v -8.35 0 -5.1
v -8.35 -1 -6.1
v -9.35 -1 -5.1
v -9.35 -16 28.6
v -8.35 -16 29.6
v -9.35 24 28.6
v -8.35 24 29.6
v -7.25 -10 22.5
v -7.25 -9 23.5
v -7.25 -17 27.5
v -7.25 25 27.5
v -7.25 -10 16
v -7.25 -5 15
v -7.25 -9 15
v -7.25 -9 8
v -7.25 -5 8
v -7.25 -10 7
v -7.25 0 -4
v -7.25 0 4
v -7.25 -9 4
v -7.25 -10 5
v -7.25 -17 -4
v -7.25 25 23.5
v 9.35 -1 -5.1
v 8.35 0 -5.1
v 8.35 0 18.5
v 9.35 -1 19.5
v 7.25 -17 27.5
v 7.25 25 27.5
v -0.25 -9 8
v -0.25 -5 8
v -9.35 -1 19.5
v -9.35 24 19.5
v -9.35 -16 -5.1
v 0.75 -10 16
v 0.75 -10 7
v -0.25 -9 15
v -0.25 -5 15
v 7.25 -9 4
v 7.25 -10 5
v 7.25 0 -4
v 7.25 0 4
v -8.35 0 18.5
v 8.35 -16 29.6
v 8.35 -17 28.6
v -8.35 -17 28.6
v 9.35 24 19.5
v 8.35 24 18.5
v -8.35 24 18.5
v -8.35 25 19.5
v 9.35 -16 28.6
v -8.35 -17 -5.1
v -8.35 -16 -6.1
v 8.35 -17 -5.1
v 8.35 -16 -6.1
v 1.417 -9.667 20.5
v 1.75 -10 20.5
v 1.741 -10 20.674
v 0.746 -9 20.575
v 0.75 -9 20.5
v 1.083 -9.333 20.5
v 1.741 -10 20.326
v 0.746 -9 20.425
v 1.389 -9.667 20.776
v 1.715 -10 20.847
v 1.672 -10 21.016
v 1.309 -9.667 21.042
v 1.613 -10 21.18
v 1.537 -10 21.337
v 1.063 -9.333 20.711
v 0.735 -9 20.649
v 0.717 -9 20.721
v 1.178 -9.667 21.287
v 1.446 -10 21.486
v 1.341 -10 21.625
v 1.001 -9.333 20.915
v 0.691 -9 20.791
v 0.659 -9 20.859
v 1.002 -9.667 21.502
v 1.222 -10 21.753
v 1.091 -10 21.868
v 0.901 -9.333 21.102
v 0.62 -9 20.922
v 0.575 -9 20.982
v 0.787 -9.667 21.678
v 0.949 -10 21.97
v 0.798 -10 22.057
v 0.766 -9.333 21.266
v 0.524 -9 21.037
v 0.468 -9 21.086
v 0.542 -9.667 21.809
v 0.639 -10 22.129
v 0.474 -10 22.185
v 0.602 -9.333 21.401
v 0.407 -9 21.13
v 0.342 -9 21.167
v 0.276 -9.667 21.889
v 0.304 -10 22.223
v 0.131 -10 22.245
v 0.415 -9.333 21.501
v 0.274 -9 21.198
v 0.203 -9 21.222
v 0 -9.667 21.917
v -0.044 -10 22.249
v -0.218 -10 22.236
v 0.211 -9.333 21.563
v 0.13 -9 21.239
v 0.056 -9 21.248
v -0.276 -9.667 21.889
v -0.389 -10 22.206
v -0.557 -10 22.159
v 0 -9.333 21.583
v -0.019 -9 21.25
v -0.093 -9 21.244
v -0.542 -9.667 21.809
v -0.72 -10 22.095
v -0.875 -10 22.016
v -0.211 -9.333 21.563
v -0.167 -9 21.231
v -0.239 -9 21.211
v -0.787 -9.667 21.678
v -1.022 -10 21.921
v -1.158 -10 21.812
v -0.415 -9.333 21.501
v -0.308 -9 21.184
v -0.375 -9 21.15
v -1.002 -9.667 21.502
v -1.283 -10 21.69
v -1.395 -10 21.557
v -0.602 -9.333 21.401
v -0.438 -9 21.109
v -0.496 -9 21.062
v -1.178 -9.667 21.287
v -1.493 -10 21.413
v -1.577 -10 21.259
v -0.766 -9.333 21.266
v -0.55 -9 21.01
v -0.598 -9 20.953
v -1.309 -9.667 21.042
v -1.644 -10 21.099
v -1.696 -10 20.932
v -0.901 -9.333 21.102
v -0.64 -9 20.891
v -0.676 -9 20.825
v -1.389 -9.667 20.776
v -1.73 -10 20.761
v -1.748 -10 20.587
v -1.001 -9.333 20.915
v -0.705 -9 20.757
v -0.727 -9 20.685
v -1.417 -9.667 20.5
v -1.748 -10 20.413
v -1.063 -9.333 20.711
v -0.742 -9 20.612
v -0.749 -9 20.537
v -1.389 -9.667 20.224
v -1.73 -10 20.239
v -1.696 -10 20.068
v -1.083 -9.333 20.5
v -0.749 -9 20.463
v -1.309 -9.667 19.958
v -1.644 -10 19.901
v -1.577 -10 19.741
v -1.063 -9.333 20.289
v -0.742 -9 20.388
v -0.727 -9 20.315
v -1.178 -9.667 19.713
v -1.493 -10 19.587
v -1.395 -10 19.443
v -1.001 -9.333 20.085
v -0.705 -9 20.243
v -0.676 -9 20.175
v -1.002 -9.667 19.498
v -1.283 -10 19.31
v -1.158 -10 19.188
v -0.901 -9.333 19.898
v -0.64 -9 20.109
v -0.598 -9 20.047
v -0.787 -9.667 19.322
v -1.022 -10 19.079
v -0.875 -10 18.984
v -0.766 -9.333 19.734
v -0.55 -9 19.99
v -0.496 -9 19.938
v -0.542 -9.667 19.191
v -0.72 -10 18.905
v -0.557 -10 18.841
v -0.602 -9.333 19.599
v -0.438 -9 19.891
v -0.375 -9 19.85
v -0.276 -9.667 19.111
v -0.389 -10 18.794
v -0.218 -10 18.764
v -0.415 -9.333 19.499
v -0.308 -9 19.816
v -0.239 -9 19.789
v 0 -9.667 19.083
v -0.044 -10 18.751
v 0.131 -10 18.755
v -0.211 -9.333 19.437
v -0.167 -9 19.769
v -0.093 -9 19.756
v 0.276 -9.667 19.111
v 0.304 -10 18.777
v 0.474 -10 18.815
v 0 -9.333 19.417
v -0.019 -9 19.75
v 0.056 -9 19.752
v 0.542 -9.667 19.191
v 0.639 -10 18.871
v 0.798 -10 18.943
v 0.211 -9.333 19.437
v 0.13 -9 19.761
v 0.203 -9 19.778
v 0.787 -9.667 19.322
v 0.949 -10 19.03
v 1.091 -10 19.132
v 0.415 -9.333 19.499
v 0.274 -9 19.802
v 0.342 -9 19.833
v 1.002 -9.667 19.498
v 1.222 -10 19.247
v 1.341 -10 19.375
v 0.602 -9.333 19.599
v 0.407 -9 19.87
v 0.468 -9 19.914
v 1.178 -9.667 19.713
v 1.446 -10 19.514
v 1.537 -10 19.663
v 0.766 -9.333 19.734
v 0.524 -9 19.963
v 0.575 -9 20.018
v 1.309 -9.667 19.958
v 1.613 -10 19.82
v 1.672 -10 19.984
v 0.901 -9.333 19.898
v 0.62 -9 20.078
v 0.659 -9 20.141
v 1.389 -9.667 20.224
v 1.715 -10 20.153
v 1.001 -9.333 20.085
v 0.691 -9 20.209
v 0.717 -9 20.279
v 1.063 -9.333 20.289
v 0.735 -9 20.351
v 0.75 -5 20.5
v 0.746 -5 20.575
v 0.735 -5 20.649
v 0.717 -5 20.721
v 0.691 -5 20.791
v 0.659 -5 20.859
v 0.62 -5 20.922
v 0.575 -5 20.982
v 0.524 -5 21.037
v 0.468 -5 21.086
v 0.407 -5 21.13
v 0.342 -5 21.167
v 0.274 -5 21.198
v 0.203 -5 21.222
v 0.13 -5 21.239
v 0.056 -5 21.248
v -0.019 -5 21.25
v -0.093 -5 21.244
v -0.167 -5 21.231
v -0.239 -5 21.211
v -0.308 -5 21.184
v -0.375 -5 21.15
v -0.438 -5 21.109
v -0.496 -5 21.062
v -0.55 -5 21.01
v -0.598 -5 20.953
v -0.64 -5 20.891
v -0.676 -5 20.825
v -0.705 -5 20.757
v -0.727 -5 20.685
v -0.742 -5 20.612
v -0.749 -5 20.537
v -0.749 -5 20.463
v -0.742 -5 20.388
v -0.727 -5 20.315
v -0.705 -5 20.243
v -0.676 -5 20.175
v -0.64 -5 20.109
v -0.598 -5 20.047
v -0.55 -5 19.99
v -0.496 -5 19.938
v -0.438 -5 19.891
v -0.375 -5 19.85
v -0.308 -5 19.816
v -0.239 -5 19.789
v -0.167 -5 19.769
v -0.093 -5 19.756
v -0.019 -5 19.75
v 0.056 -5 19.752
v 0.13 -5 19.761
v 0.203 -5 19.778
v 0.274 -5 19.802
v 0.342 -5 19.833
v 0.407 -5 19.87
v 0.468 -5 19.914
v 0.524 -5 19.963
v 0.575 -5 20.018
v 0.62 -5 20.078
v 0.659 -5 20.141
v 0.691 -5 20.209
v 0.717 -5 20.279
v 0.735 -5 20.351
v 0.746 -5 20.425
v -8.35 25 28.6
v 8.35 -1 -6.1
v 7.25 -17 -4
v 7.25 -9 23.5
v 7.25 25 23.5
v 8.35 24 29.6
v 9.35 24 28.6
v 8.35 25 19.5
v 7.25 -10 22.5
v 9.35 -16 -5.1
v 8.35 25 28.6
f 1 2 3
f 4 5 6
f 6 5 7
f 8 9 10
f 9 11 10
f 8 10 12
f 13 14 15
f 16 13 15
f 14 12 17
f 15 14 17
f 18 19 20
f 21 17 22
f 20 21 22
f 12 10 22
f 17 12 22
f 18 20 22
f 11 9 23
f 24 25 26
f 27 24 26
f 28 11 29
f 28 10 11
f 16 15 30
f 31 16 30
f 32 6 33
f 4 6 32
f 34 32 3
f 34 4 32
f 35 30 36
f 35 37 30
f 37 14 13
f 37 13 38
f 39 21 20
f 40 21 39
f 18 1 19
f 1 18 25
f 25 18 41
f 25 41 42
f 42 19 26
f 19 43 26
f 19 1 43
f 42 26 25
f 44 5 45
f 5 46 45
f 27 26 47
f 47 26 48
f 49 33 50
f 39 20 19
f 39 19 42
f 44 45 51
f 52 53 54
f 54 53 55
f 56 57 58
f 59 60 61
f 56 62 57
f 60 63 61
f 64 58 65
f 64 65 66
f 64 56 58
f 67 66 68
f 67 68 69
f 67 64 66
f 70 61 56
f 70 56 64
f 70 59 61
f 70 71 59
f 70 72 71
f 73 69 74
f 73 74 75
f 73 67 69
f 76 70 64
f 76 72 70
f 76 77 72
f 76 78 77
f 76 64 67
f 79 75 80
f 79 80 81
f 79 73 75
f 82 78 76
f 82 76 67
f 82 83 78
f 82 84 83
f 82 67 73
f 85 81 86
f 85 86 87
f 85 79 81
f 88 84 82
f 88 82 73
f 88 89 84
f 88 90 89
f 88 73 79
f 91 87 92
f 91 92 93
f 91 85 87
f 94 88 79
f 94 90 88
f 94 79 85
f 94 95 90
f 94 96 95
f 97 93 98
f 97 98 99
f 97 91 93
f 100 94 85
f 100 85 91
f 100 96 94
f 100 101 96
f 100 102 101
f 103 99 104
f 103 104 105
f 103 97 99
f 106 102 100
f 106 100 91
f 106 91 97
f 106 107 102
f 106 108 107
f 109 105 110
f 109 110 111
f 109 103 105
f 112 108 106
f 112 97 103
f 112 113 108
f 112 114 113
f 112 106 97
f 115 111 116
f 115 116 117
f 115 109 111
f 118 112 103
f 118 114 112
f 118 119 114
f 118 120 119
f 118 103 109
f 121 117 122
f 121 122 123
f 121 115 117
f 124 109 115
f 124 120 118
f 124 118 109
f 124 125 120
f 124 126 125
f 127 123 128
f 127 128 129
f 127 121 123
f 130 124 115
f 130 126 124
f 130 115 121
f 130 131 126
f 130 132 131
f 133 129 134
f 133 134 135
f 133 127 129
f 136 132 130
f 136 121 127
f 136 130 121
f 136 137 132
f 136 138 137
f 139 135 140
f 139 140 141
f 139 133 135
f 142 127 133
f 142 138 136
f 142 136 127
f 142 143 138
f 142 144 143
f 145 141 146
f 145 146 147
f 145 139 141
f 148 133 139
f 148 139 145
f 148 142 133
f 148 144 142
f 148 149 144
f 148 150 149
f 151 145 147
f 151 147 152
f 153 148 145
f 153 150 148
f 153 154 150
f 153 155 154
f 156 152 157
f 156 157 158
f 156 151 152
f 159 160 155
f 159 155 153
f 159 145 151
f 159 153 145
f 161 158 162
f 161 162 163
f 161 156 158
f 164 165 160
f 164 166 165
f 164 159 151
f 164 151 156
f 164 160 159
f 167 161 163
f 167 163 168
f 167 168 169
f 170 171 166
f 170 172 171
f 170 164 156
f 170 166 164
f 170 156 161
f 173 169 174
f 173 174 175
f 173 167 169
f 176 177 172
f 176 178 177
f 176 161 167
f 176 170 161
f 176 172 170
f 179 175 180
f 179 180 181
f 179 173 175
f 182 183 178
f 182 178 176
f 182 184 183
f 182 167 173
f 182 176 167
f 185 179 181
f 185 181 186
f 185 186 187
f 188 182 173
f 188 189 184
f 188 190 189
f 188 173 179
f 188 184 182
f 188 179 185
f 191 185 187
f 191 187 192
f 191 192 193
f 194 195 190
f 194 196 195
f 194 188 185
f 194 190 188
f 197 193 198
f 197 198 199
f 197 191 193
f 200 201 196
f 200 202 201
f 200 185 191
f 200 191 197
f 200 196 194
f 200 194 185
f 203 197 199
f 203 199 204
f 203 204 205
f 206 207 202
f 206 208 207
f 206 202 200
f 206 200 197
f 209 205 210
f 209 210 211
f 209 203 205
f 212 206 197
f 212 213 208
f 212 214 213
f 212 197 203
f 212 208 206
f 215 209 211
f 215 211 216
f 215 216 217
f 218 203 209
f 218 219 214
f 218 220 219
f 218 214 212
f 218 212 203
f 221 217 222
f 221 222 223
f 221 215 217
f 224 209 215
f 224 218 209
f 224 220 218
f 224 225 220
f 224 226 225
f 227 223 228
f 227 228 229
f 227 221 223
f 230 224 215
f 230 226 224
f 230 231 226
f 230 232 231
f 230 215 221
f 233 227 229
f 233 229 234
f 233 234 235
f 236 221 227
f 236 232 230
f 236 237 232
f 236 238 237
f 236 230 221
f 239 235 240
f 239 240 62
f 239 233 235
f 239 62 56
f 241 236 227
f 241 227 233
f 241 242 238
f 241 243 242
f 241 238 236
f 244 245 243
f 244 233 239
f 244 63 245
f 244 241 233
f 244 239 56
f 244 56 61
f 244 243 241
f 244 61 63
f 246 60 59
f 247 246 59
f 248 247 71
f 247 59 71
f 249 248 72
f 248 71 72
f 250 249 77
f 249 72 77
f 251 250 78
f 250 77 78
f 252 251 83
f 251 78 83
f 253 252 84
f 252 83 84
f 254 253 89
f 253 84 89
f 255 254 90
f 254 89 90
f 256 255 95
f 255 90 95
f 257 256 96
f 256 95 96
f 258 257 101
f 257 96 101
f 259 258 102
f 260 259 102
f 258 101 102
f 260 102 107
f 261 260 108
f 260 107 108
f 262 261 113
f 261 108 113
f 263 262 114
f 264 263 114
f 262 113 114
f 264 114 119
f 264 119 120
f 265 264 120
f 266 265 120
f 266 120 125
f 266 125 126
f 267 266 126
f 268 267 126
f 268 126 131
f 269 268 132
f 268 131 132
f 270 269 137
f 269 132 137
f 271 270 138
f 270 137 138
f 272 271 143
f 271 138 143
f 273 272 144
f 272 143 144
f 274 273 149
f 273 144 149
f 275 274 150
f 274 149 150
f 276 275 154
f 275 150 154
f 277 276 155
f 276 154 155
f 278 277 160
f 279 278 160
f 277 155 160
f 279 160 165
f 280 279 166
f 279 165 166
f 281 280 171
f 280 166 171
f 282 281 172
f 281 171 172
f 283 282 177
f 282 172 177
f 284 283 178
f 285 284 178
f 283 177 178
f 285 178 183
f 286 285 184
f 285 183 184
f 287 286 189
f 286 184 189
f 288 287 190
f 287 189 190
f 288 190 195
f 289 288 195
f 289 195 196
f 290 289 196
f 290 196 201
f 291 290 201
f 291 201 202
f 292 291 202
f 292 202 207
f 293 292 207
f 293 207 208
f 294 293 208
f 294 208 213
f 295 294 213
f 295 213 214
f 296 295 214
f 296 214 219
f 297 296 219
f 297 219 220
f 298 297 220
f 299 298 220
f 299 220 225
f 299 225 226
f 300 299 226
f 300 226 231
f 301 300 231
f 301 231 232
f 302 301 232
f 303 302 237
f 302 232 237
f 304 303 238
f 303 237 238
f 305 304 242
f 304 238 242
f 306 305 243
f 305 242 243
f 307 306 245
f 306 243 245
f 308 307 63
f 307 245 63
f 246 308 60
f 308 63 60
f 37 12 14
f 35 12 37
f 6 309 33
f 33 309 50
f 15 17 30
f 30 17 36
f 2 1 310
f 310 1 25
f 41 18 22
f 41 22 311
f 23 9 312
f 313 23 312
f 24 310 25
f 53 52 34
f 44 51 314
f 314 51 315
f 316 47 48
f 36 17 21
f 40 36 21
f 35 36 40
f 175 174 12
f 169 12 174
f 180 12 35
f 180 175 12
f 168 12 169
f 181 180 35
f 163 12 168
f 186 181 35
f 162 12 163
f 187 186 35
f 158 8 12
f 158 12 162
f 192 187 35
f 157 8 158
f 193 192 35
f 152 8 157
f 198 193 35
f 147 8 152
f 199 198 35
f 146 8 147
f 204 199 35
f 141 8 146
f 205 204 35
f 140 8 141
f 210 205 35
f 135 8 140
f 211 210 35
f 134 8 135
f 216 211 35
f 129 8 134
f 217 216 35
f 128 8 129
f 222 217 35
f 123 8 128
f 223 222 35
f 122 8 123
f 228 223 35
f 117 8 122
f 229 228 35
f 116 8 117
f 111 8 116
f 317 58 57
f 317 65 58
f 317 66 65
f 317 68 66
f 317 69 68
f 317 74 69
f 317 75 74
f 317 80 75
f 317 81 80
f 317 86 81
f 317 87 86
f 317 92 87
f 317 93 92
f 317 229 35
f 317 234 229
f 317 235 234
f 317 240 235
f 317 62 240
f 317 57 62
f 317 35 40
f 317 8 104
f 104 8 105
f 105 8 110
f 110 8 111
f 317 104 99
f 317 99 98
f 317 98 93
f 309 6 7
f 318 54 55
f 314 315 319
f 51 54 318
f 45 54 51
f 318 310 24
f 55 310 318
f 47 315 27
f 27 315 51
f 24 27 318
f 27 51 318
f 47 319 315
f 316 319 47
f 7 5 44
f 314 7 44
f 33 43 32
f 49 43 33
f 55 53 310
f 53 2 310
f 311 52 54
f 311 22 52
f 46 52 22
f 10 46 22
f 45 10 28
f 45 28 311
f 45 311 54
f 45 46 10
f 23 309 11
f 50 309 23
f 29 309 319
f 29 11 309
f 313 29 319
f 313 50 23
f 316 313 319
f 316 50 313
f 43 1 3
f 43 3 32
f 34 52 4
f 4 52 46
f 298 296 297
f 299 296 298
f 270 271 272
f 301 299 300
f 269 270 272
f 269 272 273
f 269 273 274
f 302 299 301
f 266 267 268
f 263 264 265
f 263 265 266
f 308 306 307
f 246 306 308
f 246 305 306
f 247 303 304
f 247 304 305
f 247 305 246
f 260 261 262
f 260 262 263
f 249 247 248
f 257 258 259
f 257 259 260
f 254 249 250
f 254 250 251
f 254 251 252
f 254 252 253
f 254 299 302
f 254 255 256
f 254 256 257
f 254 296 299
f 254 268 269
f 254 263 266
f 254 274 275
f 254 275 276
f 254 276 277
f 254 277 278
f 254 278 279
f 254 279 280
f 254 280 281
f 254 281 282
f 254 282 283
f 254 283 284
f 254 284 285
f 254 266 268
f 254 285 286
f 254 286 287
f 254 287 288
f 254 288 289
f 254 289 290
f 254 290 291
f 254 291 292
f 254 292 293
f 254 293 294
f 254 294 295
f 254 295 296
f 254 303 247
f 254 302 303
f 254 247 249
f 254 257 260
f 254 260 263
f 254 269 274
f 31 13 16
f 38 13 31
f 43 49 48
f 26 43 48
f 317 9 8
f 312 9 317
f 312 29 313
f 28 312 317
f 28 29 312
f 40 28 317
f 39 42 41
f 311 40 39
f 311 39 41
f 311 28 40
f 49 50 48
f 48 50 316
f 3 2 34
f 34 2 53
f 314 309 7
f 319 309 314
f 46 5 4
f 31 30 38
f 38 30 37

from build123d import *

# Parameters (mm, degrees)
SKETCH_W        = 18.7
SKETCH_H        = 35.7
PAD_DEPTH       = 17
SKETCH001_W     = 14.5
SKETCH001_H     = 31.5
POCKET_DEPTH    = 7
SKETCH002_W     = 14.5
SKETCH002_H     = 8
SKETCH002_H_2   = 4
POCKET001_DEPTH = 10.001
SKETCH003_R     = 0.75
SKETCH003_W     = 7
SKETCH003_H     = 7
POCKET002_DEPTH = 5
SKETCH004_W     = 18.7
SKETCH004_H     = 11.1
SKETCH004_W_2   = 14.5
SKETCH004_H_2   = 4
PAD001_DEPTH    = 25
CHAMFER_SIZE    = 1


with BuildPart() as part:
    # Sketch → Pad (new body)
    with BuildSketch(Plane.XZ):
        with Locations((0, 11.75)):
            Rectangle(SKETCH_W, SKETCH_H)
    extrude(amount=PAD_DEPTH)

    # Sketch001 (on Face6 of Pad) → Pocket (cut)
    with BuildSketch(Plane.XZ.offset(17)):
        with Locations((0, 11.75)):
            Rectangle(SKETCH001_W, SKETCH001_H)
    extrude(amount=-POCKET_DEPTH, mode=Mode.SUBTRACT)

    # Sketch002 (on Face11 of Pocket) → Pocket001 (cut, through all)
    with BuildSketch(Plane.XZ.offset(10)):
        Rectangle(SKETCH002_W, SKETCH002_H)
        with Locations((0, 25.5)):
            Rectangle(SKETCH002_W, SKETCH002_H_2)
    extrude(amount=-POCKET001_DEPTH, mode=Mode.SUBTRACT)

    # Sketch003 (on Face9 of Pocket001) → Pocket002 (cut)
    with BuildSketch(Plane.XZ.offset(10)):
        with Locations((0, 20.5)):
            Circle(SKETCH003_R)
        with Locations((-3.75, 11.5)):
            Rectangle(SKETCH003_W, SKETCH003_H)
    extrude(amount=-POCKET002_DEPTH, mode=Mode.SUBTRACT)

    # Sketch004 (on Face4 of Pocket002) → Pad001 (join)
    with BuildSketch(Plane(origin=(0, 0, 0), x_dir=(1, 0, 0), z_dir=(0, 1, 0))):
        with Locations((0, -24.05)):
            Rectangle(SKETCH004_W, SKETCH004_H)
        with Locations((0, -25.5)):
            Rectangle(SKETCH004_W_2, SKETCH004_H_2, mode=Mode.SUBTRACT)
    extrude(amount=PAD001_DEPTH)

    # Chamfer
    chamfer_edges = [part.edges().sort_by_distance(p)[0] for p in [
        (0, -17, 29.6),
        (9.35, -17, 11.75),
        (9.35, 4, 29.6),
        (-9.35, 4, 29.6),
        (-9.35, -17, 11.75),
        (0, -17, -6.1),
        (9.35, -8.5, -6.1),
        (-9.35, -8.5, -6.1),
        (0, 0, -6.1),
        (9.35, 0, 6.2),
        (9.35, 12.5, 18.5),
        (9.35, 25, 24.05),
        (-9.35, 25, 24.05),
        (-9.35, 12.5, 18.5),
        (-9.35, 0, 6.2),
        (0, 25, 18.5),
        (0, 25, 29.6),
        (0, -10, 23.5),
        (0, -10, 4),
        (-0.75, -10, 20.5),
        (-3.75, -10, 15),
        (-0.25, -10, 11.5),
        (-3.75, -10, 8),
    ]]
    chamfer(chamfer_edges, length=CHAMFER_SIZE)


solid = part.part
